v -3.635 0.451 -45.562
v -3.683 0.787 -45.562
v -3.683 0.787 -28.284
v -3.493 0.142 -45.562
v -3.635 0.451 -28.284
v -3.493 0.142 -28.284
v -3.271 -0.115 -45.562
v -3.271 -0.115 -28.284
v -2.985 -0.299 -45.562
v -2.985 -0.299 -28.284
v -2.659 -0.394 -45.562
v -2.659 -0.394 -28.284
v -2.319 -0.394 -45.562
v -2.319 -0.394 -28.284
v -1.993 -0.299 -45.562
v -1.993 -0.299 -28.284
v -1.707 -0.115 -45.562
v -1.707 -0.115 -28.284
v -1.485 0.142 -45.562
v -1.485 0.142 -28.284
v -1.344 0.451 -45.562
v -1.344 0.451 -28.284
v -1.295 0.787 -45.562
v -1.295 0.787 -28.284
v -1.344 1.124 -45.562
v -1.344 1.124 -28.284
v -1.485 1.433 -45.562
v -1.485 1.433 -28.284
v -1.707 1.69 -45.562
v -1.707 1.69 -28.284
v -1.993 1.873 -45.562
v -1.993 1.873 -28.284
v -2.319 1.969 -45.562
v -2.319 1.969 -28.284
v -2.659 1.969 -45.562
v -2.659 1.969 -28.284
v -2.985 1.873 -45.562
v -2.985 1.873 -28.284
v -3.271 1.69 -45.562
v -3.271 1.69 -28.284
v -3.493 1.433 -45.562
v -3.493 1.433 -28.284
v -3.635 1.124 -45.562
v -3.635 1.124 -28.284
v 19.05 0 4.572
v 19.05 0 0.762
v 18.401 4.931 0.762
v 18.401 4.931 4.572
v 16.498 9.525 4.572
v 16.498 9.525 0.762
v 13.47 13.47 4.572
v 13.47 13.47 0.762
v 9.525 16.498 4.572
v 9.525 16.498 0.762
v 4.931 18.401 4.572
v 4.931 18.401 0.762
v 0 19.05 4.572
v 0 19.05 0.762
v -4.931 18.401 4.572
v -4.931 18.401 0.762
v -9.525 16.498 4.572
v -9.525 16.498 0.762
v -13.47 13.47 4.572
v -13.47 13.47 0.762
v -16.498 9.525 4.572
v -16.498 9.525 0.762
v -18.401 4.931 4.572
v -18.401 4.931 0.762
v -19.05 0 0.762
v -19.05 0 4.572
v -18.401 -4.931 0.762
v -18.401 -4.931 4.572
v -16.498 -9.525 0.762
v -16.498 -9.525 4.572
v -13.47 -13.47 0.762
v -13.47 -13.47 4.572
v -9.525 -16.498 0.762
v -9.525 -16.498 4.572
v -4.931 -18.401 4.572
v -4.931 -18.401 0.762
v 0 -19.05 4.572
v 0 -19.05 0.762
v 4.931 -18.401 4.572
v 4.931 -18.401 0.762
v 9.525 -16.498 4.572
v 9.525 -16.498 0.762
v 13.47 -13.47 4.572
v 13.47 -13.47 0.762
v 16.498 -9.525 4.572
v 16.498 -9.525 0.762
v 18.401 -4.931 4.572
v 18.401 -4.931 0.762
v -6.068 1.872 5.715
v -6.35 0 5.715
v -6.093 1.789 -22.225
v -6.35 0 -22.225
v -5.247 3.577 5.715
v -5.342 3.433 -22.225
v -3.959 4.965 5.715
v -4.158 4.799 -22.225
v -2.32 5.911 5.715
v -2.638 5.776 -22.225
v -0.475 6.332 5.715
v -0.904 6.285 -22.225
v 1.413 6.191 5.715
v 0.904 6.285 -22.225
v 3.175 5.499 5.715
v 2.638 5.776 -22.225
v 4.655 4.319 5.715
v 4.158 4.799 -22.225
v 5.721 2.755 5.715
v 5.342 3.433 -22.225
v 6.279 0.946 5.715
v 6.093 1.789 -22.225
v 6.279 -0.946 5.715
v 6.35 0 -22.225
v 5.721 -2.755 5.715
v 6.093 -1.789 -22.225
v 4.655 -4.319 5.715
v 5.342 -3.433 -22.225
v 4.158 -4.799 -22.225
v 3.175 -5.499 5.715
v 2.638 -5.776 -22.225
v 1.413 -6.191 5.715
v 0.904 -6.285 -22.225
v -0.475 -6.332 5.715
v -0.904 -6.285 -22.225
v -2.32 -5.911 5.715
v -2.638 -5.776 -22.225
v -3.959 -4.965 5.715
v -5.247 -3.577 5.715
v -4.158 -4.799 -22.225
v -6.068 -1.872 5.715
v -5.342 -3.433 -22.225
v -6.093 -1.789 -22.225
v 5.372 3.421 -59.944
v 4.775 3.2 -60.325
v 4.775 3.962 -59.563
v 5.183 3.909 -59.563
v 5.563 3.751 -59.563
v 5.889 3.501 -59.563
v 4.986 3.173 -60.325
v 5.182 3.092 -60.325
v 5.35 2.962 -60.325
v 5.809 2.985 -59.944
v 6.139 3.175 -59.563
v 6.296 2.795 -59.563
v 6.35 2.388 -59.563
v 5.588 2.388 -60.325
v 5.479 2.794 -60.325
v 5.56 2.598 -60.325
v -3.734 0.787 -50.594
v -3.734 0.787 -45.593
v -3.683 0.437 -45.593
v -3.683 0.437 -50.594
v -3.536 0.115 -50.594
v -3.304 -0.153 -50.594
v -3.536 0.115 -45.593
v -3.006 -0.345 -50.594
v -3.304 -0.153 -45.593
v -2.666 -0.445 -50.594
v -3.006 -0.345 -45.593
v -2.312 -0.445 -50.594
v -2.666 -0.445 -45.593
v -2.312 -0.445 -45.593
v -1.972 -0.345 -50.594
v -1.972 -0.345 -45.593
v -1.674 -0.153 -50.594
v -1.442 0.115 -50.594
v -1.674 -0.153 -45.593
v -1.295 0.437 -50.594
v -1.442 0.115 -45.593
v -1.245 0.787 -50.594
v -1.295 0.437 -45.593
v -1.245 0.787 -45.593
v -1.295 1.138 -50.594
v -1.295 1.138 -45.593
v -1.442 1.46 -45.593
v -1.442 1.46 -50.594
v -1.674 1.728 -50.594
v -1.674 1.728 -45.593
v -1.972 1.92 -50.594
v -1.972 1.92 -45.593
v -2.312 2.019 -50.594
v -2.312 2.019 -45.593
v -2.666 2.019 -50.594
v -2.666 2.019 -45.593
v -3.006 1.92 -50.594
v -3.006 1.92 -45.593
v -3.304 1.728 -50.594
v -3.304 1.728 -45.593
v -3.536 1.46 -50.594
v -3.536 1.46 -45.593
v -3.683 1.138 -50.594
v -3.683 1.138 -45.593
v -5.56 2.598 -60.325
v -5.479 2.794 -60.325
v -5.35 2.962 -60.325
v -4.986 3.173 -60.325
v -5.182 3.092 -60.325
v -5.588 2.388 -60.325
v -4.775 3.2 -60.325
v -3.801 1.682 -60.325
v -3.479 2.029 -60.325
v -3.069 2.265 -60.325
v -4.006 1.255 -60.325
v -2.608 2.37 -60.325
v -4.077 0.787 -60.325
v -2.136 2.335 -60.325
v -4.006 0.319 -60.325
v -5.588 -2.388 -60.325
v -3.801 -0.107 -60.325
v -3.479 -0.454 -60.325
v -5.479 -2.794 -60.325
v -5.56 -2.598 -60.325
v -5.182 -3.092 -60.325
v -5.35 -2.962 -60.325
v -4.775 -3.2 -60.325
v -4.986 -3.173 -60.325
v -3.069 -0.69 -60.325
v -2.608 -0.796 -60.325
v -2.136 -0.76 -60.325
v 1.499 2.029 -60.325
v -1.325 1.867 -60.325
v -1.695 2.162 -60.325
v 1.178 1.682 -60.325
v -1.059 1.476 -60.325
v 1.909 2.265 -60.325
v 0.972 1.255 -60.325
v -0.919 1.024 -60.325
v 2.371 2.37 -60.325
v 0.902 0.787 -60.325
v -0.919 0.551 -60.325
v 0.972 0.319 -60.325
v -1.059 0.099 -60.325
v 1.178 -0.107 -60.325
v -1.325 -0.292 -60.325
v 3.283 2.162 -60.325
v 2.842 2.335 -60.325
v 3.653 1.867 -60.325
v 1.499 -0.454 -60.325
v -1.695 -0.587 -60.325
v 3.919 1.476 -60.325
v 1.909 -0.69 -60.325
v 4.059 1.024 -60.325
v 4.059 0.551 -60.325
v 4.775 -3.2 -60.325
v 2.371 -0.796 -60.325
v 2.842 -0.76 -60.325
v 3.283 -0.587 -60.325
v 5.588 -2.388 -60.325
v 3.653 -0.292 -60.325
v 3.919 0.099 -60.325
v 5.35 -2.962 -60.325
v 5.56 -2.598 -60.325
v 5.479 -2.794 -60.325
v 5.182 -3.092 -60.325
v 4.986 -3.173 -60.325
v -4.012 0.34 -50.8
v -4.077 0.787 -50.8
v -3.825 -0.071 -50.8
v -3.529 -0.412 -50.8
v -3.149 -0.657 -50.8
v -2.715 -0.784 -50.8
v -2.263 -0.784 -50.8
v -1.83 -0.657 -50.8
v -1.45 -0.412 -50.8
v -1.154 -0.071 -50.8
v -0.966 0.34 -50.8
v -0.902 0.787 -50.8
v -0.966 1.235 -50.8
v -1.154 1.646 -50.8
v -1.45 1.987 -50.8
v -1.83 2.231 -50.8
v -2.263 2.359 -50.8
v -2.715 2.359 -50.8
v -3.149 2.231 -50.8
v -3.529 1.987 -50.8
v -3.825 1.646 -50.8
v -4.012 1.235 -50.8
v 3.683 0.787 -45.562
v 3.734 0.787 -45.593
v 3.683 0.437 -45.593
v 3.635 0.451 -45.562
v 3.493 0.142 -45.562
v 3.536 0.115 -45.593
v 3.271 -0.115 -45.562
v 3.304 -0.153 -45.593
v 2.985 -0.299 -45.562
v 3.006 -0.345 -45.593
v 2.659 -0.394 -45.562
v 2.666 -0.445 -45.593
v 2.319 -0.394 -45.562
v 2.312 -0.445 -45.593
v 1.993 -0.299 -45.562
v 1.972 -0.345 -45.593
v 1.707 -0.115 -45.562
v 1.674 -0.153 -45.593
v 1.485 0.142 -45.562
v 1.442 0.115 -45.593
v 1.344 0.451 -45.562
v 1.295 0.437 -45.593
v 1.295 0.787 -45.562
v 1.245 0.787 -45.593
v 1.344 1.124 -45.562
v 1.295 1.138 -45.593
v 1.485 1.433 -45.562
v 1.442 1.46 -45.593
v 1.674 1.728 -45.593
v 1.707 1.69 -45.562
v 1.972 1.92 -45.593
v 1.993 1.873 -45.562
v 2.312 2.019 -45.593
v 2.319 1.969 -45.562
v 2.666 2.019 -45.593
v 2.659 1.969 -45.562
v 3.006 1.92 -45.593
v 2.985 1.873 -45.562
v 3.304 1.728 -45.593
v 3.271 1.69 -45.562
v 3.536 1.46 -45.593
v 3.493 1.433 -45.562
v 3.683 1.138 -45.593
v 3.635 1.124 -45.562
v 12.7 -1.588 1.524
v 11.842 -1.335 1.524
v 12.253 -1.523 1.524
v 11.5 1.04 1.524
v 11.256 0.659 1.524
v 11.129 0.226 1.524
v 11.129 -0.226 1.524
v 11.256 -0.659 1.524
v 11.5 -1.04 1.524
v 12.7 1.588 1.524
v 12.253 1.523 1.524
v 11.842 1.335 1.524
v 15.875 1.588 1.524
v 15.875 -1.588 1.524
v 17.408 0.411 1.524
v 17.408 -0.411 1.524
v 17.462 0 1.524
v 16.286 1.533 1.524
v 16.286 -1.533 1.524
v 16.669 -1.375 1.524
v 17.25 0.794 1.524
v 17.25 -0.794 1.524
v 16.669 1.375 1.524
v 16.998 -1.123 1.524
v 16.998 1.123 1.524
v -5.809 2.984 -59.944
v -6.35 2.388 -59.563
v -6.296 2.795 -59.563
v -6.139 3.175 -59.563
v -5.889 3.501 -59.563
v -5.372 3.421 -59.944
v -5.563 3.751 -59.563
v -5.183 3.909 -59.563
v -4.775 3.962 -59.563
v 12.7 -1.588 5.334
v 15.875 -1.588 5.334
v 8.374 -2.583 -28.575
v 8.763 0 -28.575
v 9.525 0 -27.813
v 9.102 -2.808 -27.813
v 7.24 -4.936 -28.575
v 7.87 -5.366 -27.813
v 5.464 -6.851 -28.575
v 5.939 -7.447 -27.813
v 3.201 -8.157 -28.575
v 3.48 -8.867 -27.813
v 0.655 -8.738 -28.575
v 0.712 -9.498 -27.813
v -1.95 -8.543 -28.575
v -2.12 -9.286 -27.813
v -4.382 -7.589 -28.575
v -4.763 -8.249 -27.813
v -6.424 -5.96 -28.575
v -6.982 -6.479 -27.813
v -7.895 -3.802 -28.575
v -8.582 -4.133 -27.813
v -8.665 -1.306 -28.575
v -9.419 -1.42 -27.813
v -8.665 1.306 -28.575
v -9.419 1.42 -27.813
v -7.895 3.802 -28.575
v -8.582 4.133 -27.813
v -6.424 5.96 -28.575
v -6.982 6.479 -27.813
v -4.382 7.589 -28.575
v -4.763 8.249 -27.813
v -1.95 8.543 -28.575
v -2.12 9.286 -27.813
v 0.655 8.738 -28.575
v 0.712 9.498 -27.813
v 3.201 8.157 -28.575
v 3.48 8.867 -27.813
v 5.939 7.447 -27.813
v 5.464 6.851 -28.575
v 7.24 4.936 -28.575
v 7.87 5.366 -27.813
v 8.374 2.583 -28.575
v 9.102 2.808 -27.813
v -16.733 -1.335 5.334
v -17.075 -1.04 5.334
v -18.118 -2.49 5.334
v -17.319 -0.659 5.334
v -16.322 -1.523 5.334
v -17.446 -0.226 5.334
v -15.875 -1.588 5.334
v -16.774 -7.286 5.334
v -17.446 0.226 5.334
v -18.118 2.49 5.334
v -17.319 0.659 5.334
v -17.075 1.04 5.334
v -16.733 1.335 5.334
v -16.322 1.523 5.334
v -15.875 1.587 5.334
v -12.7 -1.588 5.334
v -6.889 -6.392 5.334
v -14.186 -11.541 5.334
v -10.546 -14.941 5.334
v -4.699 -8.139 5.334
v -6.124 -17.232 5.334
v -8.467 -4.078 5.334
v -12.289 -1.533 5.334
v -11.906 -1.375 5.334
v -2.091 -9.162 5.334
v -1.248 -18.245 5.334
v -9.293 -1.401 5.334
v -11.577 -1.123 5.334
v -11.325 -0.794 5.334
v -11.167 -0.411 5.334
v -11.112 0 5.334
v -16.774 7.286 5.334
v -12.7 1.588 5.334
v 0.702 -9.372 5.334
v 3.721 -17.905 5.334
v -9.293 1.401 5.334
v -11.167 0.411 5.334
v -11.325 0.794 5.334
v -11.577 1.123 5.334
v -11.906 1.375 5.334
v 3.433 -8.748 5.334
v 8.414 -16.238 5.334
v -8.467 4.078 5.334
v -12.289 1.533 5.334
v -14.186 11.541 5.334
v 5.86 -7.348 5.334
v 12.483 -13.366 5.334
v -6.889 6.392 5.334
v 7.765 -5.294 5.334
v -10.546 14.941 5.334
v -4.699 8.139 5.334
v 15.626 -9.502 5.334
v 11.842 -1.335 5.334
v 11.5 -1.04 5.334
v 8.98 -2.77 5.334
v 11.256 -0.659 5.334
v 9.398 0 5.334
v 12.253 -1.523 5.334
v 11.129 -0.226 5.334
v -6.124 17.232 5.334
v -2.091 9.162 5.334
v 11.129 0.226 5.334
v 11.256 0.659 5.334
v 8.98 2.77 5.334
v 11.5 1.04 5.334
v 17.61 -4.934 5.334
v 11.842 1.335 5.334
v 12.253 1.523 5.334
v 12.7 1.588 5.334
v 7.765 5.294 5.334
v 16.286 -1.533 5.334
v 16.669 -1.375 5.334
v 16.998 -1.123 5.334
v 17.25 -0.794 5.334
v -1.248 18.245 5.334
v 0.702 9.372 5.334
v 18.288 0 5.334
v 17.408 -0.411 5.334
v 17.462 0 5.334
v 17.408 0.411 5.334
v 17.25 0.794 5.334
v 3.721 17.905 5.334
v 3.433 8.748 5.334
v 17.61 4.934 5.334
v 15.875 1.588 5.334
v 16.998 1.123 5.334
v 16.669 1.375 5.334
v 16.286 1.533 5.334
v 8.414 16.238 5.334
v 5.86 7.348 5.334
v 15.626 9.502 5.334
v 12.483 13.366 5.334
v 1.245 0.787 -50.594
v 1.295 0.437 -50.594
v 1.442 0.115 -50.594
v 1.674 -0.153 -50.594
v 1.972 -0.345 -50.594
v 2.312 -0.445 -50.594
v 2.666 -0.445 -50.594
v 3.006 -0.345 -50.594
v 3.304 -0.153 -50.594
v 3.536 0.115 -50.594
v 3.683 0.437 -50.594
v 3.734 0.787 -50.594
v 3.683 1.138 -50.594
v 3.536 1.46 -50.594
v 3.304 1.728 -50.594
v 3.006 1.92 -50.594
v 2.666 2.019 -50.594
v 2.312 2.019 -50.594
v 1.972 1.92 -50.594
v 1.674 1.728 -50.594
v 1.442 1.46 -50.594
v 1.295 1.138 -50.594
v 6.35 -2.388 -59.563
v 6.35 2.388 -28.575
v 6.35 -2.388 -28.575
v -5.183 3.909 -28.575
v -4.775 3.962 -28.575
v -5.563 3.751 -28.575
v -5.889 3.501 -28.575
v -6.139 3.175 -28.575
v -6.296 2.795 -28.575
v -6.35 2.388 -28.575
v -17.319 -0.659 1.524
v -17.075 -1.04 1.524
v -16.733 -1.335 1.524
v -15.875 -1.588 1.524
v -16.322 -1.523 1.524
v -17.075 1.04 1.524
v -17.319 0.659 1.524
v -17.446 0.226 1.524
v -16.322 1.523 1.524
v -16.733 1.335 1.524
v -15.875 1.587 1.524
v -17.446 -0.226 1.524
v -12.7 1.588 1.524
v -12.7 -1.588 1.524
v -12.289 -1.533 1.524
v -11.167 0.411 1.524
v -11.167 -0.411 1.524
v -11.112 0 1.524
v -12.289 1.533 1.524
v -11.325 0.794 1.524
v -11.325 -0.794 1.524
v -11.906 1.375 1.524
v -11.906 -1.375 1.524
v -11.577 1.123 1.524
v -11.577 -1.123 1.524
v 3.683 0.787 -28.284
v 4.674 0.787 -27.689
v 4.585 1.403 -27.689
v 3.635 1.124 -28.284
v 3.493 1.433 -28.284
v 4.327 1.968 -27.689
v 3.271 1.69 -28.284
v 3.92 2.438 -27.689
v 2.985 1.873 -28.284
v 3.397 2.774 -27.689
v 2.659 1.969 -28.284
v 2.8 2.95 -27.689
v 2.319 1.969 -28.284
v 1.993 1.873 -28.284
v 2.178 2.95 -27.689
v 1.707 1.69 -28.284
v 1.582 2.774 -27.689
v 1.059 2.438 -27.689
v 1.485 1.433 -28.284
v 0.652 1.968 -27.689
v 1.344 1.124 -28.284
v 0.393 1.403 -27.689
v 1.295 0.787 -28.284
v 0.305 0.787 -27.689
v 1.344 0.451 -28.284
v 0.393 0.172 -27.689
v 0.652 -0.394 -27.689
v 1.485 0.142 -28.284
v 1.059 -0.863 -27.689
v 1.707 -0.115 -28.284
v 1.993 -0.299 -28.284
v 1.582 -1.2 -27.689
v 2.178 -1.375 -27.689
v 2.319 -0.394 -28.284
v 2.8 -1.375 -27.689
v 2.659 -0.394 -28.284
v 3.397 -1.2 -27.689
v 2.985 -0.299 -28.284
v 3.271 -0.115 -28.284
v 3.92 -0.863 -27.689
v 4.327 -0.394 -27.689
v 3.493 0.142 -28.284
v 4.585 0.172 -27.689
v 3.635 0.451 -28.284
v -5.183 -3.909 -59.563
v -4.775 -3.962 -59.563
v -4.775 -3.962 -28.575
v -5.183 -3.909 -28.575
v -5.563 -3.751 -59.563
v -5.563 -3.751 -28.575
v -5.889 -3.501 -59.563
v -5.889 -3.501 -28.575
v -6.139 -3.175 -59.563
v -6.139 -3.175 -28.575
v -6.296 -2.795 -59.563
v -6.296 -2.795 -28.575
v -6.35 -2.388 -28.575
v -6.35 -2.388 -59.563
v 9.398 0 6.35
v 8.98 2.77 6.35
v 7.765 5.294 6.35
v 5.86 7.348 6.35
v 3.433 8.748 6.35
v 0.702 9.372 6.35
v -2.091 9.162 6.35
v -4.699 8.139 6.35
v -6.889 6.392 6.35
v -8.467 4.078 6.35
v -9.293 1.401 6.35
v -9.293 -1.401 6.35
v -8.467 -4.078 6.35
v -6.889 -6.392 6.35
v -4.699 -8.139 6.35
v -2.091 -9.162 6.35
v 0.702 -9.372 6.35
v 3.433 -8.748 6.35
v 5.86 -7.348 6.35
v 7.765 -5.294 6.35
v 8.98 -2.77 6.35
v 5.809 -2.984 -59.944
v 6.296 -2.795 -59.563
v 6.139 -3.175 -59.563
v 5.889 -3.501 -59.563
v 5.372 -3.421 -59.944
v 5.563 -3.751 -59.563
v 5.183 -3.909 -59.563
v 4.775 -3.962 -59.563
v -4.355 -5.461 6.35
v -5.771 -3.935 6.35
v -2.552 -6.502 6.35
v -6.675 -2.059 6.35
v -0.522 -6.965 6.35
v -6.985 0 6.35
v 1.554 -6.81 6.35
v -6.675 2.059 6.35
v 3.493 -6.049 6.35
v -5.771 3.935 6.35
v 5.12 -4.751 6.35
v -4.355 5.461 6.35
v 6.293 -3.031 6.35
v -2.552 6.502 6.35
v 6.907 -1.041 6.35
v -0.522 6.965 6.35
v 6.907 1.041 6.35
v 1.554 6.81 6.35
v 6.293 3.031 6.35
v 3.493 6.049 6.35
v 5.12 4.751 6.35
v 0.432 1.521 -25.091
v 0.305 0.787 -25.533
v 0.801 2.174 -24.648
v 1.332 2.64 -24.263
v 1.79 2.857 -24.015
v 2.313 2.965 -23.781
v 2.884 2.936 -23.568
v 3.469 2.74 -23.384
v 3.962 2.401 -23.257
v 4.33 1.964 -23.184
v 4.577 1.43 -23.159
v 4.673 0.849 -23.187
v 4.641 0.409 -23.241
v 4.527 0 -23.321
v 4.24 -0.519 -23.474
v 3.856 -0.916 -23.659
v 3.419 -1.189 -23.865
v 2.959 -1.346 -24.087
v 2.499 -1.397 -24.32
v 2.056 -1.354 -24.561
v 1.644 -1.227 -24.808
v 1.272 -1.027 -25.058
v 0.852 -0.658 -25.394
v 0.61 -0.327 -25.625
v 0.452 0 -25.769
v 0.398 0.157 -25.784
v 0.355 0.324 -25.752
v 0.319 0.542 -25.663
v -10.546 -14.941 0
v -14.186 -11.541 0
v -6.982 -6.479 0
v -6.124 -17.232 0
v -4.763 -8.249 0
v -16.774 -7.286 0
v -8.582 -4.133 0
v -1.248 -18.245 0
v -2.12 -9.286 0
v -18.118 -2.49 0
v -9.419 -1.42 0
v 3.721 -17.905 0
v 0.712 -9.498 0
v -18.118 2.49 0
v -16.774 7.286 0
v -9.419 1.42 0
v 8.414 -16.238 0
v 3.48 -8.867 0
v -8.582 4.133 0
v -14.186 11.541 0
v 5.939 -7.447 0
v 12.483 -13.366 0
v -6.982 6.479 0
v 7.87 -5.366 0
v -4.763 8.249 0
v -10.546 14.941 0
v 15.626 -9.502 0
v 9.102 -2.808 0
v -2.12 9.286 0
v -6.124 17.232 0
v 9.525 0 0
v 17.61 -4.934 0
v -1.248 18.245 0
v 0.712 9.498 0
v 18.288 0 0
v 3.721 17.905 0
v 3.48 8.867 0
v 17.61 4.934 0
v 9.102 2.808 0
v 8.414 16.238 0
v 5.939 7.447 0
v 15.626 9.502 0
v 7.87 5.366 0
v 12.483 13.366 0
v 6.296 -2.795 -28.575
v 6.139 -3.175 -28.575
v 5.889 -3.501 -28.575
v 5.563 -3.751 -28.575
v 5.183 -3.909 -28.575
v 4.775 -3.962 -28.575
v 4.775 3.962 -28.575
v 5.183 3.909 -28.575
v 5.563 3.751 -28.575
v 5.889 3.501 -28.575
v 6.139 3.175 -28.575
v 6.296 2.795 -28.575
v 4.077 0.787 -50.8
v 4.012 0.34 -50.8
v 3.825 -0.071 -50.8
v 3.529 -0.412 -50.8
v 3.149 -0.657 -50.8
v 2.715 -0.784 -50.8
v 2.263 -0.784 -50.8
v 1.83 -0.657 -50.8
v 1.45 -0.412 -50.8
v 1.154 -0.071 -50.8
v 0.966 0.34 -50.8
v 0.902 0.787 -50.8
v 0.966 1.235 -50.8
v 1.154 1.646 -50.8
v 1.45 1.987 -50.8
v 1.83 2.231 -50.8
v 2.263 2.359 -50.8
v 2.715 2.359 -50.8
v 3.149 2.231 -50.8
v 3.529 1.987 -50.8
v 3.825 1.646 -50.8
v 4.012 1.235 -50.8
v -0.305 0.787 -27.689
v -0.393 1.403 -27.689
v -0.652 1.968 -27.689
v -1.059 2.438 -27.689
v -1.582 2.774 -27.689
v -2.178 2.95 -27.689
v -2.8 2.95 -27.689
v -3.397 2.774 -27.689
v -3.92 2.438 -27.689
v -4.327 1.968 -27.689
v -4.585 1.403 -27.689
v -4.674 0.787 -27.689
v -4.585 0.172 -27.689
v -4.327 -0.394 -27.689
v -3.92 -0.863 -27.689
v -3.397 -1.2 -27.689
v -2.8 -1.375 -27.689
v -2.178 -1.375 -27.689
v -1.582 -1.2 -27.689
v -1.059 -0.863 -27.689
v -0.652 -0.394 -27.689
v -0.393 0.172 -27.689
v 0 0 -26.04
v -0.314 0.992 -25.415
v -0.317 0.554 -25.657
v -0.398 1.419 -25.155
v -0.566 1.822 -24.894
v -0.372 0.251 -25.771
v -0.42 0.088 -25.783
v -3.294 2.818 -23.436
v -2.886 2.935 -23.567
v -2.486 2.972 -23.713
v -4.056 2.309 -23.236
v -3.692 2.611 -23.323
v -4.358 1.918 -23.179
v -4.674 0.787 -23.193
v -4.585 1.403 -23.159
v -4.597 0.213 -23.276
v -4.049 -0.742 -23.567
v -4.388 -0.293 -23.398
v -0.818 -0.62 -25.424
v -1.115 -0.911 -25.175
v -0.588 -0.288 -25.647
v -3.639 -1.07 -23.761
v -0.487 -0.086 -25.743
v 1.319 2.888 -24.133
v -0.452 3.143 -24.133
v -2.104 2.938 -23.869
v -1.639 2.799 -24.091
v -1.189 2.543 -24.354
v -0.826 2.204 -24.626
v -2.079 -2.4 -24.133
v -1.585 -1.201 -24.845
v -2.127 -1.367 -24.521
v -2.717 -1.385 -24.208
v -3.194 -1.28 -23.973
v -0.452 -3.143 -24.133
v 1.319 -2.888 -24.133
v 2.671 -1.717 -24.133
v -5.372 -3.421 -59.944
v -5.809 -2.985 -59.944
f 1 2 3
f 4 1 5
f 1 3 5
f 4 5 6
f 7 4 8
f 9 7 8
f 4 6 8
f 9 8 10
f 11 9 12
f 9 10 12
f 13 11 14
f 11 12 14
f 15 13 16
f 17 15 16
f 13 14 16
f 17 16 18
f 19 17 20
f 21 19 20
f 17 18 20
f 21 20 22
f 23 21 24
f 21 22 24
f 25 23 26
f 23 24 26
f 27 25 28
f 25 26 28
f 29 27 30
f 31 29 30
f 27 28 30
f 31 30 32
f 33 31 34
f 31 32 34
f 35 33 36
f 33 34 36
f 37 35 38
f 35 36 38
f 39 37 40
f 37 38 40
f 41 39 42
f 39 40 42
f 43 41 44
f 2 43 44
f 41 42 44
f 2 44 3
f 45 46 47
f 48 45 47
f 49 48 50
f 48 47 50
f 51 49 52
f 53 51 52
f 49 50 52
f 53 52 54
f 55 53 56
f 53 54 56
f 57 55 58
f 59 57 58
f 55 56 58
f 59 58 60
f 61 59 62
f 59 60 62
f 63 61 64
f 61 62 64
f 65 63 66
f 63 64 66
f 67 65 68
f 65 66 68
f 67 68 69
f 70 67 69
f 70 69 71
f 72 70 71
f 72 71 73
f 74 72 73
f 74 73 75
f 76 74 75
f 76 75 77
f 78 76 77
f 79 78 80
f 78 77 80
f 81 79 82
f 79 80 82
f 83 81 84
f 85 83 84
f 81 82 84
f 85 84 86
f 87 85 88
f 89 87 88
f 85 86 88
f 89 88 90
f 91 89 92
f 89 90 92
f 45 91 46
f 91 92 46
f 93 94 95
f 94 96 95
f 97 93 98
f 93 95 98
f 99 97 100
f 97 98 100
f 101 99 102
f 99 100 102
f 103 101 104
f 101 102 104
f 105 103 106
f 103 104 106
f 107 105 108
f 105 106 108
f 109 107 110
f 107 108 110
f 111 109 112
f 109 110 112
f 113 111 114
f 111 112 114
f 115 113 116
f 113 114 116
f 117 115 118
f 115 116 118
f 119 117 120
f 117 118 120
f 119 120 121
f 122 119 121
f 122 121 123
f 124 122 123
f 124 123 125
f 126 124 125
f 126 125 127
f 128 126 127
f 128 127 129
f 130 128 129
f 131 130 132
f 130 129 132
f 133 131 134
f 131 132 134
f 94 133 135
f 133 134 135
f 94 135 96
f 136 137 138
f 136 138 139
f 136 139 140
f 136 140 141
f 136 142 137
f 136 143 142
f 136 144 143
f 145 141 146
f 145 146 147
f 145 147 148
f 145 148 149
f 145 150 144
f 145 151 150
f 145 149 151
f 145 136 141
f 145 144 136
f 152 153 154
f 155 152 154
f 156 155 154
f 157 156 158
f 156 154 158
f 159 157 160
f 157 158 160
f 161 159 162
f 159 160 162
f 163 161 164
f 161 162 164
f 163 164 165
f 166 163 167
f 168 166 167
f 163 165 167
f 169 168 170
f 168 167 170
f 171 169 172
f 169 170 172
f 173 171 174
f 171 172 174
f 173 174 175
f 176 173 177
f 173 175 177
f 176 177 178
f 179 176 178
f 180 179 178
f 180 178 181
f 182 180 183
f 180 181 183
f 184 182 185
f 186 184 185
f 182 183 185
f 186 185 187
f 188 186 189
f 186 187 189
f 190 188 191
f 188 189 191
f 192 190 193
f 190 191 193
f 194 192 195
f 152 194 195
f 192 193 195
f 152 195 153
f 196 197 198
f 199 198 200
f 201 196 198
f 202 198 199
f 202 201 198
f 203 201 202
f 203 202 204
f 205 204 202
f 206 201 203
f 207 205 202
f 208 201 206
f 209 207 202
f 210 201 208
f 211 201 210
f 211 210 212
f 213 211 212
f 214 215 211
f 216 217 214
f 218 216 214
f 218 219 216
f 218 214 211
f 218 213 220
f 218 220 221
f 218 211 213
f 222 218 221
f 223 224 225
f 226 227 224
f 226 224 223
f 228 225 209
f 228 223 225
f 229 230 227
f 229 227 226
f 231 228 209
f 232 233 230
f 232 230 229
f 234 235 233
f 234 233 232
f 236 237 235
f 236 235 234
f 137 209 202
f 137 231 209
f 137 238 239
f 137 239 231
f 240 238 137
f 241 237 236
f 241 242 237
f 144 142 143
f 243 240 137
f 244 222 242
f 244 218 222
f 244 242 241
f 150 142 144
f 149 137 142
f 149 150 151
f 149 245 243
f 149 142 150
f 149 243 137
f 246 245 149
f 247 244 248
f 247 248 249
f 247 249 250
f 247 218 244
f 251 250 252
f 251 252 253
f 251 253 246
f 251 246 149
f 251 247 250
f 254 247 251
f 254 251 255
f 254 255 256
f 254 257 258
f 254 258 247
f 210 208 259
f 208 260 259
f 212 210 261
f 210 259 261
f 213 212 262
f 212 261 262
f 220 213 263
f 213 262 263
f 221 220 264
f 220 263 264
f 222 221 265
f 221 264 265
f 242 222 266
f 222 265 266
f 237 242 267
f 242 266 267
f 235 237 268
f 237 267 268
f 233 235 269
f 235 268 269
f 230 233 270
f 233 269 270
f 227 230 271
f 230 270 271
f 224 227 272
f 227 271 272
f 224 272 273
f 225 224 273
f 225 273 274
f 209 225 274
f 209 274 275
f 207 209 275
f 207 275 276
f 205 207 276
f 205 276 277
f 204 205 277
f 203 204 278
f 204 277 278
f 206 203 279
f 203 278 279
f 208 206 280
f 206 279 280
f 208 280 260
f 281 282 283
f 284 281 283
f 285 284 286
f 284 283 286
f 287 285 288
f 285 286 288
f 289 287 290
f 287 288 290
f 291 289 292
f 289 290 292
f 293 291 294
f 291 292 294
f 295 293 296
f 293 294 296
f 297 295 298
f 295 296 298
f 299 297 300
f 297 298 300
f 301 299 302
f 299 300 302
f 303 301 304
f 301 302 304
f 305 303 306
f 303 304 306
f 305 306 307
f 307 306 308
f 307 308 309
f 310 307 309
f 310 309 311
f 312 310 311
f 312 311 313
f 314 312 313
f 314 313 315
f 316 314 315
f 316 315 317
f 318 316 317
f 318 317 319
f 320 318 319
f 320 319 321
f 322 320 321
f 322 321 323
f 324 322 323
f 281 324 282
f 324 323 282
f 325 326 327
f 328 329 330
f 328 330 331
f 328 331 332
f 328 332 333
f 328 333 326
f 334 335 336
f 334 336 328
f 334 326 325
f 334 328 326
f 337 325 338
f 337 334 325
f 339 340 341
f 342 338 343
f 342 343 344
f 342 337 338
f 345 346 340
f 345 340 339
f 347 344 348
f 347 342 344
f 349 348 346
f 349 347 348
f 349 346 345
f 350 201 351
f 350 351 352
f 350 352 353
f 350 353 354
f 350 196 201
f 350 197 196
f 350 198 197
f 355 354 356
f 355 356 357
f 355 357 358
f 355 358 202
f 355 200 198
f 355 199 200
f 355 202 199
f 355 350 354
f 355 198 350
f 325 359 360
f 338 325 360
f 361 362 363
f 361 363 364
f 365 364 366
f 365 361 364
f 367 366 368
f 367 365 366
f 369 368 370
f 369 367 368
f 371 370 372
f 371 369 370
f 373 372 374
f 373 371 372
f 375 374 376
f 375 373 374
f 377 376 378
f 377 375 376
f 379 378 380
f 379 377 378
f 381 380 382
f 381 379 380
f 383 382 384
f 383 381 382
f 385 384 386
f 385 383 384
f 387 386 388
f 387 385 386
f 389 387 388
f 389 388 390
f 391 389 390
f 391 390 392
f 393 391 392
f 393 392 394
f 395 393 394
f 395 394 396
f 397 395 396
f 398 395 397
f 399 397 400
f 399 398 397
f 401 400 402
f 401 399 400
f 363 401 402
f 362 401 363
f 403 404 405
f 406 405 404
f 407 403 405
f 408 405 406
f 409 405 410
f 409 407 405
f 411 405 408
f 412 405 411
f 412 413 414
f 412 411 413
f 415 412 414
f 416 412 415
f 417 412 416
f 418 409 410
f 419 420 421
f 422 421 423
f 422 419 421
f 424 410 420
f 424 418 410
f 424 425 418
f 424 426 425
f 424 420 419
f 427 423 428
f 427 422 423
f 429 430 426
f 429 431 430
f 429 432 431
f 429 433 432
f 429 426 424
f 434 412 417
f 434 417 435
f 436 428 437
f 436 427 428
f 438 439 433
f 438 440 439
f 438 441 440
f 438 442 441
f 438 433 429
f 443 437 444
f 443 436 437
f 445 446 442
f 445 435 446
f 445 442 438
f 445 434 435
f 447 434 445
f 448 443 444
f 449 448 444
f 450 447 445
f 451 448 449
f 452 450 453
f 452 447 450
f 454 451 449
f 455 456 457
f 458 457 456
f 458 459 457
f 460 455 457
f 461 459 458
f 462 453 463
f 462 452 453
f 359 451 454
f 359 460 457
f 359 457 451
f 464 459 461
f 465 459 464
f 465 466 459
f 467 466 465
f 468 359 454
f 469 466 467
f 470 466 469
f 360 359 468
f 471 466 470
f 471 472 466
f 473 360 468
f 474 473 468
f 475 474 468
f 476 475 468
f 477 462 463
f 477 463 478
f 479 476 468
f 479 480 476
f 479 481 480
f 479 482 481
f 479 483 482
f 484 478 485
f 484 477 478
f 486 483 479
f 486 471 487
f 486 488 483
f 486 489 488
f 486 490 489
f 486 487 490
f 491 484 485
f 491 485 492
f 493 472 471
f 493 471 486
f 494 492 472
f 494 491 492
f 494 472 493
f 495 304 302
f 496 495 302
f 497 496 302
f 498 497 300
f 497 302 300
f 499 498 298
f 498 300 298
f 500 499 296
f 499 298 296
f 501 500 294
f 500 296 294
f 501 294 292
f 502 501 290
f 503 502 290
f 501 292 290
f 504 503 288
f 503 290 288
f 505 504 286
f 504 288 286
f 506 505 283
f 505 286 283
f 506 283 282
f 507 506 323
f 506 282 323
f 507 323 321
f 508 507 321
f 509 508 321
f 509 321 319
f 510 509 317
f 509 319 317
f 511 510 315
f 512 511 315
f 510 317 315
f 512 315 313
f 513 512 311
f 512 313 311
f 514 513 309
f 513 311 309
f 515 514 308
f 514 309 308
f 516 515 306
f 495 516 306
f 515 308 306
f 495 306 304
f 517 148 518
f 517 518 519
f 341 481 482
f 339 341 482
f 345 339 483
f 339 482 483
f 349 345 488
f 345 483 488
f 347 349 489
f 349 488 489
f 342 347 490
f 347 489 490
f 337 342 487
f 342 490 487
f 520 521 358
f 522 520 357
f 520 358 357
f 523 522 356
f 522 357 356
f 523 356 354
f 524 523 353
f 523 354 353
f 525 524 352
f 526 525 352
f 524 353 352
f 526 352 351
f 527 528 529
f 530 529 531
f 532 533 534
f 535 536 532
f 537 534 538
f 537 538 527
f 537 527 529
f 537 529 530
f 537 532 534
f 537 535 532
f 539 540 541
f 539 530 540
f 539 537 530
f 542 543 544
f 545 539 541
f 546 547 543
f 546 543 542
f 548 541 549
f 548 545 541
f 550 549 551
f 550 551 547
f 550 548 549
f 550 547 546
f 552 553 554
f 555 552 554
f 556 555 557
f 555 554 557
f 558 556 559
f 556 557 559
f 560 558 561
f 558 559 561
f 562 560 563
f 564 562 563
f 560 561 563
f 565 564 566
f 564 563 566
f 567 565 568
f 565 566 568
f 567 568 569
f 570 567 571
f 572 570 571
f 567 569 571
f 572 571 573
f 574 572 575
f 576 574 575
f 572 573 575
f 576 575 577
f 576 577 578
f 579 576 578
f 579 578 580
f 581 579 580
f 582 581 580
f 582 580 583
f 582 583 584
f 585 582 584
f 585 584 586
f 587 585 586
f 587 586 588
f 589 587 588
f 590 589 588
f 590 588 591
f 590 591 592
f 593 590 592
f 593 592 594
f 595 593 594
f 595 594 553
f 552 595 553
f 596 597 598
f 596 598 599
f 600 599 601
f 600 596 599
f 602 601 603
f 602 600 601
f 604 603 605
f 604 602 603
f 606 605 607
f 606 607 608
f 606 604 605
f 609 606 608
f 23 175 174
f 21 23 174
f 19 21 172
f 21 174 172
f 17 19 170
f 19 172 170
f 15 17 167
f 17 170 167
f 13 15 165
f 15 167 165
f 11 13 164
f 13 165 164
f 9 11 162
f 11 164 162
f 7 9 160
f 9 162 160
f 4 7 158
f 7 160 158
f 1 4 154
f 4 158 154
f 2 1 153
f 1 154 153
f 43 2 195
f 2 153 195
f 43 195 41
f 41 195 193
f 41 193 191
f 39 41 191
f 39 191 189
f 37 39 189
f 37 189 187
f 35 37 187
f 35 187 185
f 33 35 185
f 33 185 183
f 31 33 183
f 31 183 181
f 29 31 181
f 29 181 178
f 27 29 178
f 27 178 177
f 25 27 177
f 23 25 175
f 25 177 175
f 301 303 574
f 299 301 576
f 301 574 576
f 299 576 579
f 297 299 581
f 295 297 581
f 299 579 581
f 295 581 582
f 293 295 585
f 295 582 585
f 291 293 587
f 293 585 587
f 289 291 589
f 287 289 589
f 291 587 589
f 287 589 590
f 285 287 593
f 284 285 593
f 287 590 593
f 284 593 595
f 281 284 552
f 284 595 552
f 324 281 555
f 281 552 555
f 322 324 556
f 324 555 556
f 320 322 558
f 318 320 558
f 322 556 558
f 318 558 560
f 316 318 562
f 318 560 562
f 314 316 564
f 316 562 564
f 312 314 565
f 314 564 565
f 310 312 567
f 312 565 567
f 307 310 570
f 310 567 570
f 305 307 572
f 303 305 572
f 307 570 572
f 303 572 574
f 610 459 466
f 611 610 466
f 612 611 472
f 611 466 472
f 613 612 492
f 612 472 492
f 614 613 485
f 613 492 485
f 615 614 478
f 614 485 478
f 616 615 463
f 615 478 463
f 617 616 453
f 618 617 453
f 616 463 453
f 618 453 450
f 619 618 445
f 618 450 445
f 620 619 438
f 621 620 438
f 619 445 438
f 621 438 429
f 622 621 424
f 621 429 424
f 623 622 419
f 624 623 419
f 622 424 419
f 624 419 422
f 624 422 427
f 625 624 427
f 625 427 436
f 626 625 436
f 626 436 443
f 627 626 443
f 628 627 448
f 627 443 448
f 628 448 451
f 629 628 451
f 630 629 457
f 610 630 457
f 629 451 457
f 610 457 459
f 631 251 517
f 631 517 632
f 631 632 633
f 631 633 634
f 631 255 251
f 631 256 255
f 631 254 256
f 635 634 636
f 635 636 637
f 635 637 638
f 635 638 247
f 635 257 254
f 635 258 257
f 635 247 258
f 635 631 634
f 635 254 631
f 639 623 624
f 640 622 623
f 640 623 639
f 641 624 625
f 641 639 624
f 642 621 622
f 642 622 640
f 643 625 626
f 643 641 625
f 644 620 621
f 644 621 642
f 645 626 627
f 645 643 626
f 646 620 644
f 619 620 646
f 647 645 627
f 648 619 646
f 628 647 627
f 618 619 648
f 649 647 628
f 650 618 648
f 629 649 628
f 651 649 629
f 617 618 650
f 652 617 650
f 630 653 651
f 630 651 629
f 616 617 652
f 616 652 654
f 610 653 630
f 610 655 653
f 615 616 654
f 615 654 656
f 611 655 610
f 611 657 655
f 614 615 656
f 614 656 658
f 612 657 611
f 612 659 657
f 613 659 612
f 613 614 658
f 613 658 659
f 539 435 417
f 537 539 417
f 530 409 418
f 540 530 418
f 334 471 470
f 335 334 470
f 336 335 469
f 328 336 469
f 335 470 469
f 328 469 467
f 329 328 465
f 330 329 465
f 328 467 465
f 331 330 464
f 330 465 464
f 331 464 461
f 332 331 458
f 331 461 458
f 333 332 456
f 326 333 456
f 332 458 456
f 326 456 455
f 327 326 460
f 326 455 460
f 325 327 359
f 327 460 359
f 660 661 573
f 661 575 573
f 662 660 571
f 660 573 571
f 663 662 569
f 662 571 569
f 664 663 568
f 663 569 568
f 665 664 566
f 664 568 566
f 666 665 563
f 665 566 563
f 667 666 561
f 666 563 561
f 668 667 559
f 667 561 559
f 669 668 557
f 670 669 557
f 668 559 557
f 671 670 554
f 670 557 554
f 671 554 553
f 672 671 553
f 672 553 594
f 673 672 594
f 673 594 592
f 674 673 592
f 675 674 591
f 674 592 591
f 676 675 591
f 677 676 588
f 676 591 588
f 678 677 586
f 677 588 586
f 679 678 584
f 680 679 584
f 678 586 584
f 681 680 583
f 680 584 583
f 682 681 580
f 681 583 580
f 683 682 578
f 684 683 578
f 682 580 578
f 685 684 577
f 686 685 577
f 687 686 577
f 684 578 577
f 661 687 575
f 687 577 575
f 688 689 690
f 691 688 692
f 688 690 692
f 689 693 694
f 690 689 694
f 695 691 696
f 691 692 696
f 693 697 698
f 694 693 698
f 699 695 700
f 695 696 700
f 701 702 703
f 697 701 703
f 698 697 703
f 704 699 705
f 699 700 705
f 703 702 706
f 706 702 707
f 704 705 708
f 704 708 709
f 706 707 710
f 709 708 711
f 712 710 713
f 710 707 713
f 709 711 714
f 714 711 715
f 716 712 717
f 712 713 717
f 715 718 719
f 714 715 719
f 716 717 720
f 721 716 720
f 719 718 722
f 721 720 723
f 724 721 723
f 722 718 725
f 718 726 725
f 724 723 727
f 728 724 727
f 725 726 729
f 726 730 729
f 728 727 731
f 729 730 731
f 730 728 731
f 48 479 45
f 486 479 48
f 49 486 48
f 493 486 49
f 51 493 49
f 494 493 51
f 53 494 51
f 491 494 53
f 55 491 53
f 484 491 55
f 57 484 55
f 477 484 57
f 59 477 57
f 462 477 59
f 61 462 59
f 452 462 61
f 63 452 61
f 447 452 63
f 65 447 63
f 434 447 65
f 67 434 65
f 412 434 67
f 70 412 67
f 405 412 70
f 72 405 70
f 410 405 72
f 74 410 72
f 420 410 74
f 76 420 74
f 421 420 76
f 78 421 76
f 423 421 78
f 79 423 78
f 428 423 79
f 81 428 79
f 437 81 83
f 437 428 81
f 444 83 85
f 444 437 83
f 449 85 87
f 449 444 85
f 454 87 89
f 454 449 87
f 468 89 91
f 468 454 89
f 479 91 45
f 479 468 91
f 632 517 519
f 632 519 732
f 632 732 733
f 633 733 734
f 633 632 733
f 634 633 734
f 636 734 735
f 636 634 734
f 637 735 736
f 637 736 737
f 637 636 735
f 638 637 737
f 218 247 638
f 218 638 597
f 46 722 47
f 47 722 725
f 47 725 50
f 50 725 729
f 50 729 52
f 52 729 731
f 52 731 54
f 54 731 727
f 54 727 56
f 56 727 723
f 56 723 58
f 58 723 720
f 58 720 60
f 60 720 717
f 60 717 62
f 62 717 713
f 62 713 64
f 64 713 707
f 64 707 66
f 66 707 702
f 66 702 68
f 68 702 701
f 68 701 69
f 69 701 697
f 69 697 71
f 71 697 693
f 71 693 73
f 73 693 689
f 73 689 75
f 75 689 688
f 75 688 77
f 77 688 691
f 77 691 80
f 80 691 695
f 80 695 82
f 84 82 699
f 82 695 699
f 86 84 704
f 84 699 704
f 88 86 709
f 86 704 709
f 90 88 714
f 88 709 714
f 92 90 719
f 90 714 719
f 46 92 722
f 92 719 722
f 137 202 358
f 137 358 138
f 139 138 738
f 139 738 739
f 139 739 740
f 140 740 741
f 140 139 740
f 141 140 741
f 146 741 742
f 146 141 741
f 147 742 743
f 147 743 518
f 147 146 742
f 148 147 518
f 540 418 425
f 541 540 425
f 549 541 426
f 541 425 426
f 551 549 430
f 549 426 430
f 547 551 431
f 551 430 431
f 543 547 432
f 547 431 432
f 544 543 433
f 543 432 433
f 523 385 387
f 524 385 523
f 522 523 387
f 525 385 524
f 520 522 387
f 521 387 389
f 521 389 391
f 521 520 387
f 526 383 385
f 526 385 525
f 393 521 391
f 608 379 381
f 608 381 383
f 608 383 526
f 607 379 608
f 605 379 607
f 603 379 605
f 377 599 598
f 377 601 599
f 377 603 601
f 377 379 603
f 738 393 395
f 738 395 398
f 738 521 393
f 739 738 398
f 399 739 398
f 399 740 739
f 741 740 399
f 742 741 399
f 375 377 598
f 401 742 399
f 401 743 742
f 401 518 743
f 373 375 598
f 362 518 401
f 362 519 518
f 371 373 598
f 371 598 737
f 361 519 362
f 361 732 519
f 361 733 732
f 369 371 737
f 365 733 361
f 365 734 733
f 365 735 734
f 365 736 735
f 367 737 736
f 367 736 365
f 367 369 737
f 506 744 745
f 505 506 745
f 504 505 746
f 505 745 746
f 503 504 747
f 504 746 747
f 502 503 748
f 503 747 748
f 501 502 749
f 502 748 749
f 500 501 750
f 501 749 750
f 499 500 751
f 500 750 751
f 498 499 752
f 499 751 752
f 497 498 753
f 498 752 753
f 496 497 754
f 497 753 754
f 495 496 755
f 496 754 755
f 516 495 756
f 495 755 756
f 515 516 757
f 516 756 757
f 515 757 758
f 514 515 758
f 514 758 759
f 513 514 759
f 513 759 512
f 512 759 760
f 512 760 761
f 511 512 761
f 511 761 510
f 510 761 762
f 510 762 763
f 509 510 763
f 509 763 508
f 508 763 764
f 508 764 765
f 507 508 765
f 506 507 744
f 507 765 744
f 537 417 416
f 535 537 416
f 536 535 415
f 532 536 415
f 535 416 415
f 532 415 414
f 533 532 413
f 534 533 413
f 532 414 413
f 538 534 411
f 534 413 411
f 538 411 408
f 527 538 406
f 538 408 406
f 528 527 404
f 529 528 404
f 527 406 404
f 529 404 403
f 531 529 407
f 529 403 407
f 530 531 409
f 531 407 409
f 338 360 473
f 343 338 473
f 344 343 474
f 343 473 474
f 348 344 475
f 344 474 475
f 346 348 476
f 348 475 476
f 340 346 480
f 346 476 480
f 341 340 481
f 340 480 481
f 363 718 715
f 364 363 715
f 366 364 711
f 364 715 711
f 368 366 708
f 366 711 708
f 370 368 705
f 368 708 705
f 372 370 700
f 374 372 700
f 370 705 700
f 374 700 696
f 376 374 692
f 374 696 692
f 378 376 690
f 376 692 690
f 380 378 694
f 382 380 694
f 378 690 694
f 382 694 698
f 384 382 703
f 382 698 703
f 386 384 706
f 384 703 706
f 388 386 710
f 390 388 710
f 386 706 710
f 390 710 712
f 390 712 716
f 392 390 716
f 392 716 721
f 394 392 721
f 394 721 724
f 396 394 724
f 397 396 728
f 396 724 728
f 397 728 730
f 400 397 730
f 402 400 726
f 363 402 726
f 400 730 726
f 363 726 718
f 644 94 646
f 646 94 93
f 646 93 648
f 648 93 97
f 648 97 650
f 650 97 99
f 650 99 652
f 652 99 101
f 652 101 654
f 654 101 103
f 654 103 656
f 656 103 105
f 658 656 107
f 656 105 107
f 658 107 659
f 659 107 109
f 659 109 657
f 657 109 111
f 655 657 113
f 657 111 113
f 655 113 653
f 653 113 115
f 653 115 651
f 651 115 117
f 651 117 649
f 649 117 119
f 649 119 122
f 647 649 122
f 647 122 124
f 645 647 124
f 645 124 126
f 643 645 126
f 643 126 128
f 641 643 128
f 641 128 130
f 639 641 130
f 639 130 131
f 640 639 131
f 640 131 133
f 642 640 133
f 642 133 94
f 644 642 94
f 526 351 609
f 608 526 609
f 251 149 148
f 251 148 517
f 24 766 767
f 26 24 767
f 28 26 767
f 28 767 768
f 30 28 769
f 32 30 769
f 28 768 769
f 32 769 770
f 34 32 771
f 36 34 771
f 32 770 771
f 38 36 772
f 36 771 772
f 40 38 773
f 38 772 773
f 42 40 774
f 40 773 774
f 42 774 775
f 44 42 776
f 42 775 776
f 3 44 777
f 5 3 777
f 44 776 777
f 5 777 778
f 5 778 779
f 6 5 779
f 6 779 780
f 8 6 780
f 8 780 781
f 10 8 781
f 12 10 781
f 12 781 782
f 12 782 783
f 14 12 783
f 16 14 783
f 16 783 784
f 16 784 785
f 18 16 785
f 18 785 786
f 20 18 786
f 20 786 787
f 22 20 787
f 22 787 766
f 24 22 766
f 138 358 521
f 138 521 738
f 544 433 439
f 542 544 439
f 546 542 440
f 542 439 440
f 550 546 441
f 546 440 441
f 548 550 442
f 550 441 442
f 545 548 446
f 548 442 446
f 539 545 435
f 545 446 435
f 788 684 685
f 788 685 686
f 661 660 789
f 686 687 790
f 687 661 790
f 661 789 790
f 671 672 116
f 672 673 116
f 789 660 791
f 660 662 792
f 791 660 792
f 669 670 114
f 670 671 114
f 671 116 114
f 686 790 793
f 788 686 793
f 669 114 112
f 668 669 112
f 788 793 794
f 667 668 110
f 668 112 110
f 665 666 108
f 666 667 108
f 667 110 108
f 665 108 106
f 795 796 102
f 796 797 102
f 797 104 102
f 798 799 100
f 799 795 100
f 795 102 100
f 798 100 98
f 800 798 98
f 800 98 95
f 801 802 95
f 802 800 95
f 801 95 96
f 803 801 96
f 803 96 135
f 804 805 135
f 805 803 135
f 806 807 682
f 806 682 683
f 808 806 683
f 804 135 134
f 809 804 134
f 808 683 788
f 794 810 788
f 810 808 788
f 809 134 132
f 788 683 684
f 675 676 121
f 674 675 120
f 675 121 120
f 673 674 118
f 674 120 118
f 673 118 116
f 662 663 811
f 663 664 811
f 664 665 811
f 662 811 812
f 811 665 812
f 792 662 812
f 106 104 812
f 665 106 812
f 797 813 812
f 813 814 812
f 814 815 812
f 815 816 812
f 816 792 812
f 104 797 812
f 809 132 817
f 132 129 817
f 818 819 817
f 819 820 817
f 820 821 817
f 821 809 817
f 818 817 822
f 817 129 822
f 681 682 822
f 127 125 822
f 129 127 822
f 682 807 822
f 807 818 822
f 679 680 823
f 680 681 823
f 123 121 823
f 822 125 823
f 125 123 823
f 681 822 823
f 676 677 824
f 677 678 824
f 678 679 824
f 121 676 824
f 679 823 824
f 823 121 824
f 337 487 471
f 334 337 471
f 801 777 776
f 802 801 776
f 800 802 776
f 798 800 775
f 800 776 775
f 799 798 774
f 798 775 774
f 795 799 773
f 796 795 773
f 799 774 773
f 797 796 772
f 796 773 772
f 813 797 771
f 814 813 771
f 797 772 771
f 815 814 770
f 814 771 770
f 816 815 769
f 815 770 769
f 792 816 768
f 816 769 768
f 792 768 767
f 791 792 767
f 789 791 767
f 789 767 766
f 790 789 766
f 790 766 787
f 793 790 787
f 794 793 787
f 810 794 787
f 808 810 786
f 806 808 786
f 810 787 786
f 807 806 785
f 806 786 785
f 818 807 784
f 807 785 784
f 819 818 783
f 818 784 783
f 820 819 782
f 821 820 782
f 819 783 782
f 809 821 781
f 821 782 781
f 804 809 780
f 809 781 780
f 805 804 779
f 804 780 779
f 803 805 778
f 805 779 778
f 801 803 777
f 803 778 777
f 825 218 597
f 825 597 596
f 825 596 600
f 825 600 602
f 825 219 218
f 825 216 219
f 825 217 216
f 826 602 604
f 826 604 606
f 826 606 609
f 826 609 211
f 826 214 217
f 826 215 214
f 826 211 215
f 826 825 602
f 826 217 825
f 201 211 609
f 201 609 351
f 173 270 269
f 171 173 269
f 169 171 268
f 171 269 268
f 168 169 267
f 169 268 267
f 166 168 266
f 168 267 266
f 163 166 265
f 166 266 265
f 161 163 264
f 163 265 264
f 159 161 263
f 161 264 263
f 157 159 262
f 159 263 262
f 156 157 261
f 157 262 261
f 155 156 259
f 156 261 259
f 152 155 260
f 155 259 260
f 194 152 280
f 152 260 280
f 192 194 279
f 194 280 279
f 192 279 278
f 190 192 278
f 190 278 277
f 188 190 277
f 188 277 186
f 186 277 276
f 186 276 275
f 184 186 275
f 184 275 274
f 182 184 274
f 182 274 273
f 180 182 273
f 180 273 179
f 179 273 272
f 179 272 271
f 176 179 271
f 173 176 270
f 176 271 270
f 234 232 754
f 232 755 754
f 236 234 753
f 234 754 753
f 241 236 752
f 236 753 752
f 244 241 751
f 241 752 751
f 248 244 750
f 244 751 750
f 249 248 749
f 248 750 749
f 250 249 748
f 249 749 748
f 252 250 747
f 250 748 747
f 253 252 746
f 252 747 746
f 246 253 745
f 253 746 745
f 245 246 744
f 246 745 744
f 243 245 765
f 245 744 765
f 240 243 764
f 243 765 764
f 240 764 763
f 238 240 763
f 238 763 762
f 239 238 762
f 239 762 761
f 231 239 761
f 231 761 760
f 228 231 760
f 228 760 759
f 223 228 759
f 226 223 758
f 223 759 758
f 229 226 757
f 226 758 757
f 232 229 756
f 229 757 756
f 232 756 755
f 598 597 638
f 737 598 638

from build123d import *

# Parameters (mm, degrees)
F0_R           = 19.05
F1_DEPTH       = 5.334
F2_R           = 9.398
F3_DEPTH       = 1.016
F4_R           = 9.525
F5_DEPTH       = 28.575
F6_W           = 12.7
F6_H           = 7.9248
F7_DEPTH       = 31.75
F9_D           = 12.7
F9_DEPTH       = 28.575
F9_CSINK_D     = 13.97
F9_CSINK_ANGLE = 90
F9_TIP         = 3.8154649308
F10_SIZE       = 0.762
F12_D          = 2.3876
F14_D          = 2.4892
F14_DEPTH      = 14.732
F14_TIP        = 0.7478311264
F16_D          = 3.175
F16_DEPTH      = 9.525
F16_TIP        = 0.9538662327
F18_D          = 4.3688
F18_DEPTH      = 1.905
F18_START      = 32.1342766
F18_TIP        = 1.3125199362
F20_DEPTH      = 3.81
F21_R          = 1.5748
F22_SIZE       = 0.762


# Not quite as in the source:
# - a length typed as a fraction of an inch, garbled in the dataset ("3 / 203.2 mm" for 3/8 in), is restored


with BuildPart() as f1:
    # F0 (on Top) → F1 (new body)
    with BuildSketch(Plane.XY):
        Circle(F0_R)
    extrude(amount=F1_DEPTH)

    # F2 (on face) → F3 (join)
    with BuildSketch(Plane.XY.offset(5.334)):
        Circle(F2_R)
    extrude(amount=F3_DEPTH)

    # F4 (on face) → F5 (join)
    with BuildSketch(Plane(origin=(0, 0, 0), x_dir=(1, 0, 0), z_dir=(0, 0, -1))):
        Circle(F4_R)
    extrude(amount=F5_DEPTH)

    # F6 (on face) → F7 (join)
    with BuildSketch(Plane(origin=(0, 0, -28.575), x_dir=(1, 0, 0), z_dir=(0, 0, -1))):
        Rectangle(F6_W, F6_H)
    extrude(amount=F7_DEPTH)

    # F9
    with Locations(Plane.XY.offset(6.35)):
        with Locations((0, 0)):
            CounterSinkHole(F9_D / 2, F9_CSINK_D / 2, depth=F9_DEPTH, counter_sink_angle=F9_CSINK_ANGLE)
            with Locations((0, 0, -(F9_DEPTH + F9_TIP / 2))):  # 118° drill point
                Cone(0, F9_D / 2, F9_TIP, mode=Mode.SUBTRACT)

    # F10
    f10_edges = [f1.edges().sort_by_distance(p)[0] for p in [
        (-9.525, 0, -28.575),
        (-19.05, 0, 0),
        (-19.05, 0, 5.334),
    ]]
    chamfer(f10_edges, length=F10_SIZE)

    # F12 (through all)
    with Locations(Plane(origin=(0, 0, -60.325), x_dir=(1, 0, 0), z_dir=(0, 0, -1))):
        with Locations((2.4892, -0.7874), (-2.4892, -0.7874)):
            Hole(F12_D / 2)

    # F14
    with Locations(Plane(origin=(0, 0, -60.325), x_dir=(1, 0, 0), z_dir=(0, 0, -1))):
        with Locations((2.4892, -0.7874), (-2.4892, -0.7874)):
            Hole(F14_D / 2, depth=F14_DEPTH)
            with Locations((0, 0, -(F14_DEPTH + F14_TIP / 2))):  # 118° drill point
                Cone(0, F14_D / 2, F14_TIP, mode=Mode.SUBTRACT)

    # F16
    with Locations(Plane(origin=(0, 0, -60.325), x_dir=(1, 0, 0), z_dir=(0, 0, -1))):
        with Locations((2.4892, -0.7874), (-2.4892, -0.7874)):
            Hole(F16_D / 2, depth=F16_DEPTH)
            with Locations((0, 0, -(F16_DEPTH + F16_TIP / 2))):  # 118° drill point
                Cone(0, F16_D / 2, F16_TIP, mode=Mode.SUBTRACT)

    # F18
    # its depths count from where the whole tool has entered the part; down to there all is cleared
    with Locations(Plane.XY.offset(6.35)):
        with Locations((2.4892, 0.7874), (-2.4892, 0.7874)):
            Hole(F18_D / 2, depth=F18_START)
    with Locations(Plane.XY.offset(6.35).offset(-F18_START)):
        with Locations((2.4892, 0.7874), (-2.4892, 0.7874)):
            Hole(F18_D / 2, depth=F18_DEPTH)
            with Locations((0, 0, -(F18_DEPTH + F18_TIP / 2))):  # 118° drill point
                Cone(0, F18_D / 2, F18_TIP, mode=Mode.SUBTRACT)

    # F19 (on face) → F20 (cut)
    with BuildSketch(Plane.XY.offset(5.334)):
        with BuildLine():
            ThreePointArc((15.875, 1.5875), (14.7524679849, 1.1225320151), (14.2875, 0))
            ThreePointArc((14.2875, 0), (14.7524679849, -1.1225320151), (15.875, -1.5875))
            ThreePointArc((15.875, -1.5875), (16.9975320151, -1.1225320151), (17.4625, 0))
            ThreePointArc((17.4625, 0), (16.9975320151, 1.1225320151), (15.875, 1.5875))
        make_face()
        with BuildLine():
            ThreePointArc((12.7, -1.5875), (13.8225320151, -1.1225320151), (14.2875, 0))
            ThreePointArc((14.2875, 0), (13.8225320151, 1.1225320151), (12.7, 1.5875))
            Line((12.7, 1.5875), (12.7, -1.5875))
        make_face()
        with BuildLine():
            ThreePointArc((12.7, 1.5875), (13.8225320151, 1.1225320151), (14.2875, 0))
            ThreePointArc((14.2875, 0), (14.7524679849, 1.1225320151), (15.875, 1.5875))
            Line((15.875, 1.5875), (12.7, 1.5875))
        make_face()
        with BuildLine():
            Line((12.7, -1.5875), (12.7, 1.5875))
            ThreePointArc((12.7, 1.5875), (11.1125, 0), (12.7, -1.5875))
        make_face()
        with BuildLine():
            ThreePointArc((15.875, -1.5875), (14.7524679849, -1.1225320151), (14.2875, 0))
            ThreePointArc((14.2875, 0), (13.8225320151, -1.1225320151), (12.7, -1.5875))
            Line((12.7, -1.5875), (15.875, -1.5875))
        make_face()
        with BuildLine():
            ThreePointArc((-12.7, -1.5875), (-11.5774679849, -1.1225320151), (-11.1125, 0))
            ThreePointArc((-11.1125, 0), (-11.5774679849, 1.1225320151), (-12.7, 1.5875))
            ThreePointArc((-12.7, 1.5875), (-13.8225320151, 1.1225320151), (-14.2875, 0))
            ThreePointArc((-14.2875, 0), (-13.8225320151, -1.1225320151), (-12.7, -1.5875))
        make_face()
        with BuildLine():
            Line((-15.875, -1.5875), (-12.7, -1.5875))
            ThreePointArc((-12.7, -1.5875), (-13.8225320151, -1.1225320151), (-14.2875, 0))
            ThreePointArc((-14.2875, 0), (-14.7524679849, -1.1225320151), (-15.875, -1.5875))
        make_face()
        with BuildLine():
            ThreePointArc((-14.2875, 0), (-13.8225320151, 1.1225320151), (-12.7, 1.5875))
            Line((-12.7, 1.5875), (-15.875, 1.5875))
            ThreePointArc((-15.875, 1.5875), (-14.7524679849, 1.1225320151), (-14.2875, 0))
        make_face()
        with BuildLine():
            ThreePointArc((-15.875, -1.5875), (-14.7524679849, -1.1225320151), (-14.2875, 0))
            ThreePointArc((-14.2875, 0), (-14.7524679849, 1.1225320151), (-15.875, 1.5875))
            ThreePointArc((-15.875, 1.5875), (-17.4625, 0), (-15.875, -1.5875))
        make_face()
    extrude(amount=-F20_DEPTH, mode=Mode.SUBTRACT)

    # F21
    f21_edges = [f1.edges().sort_by_distance(p)[0] for p in [
        (6.35, 3.9624, -44.45),
        (6.35, -3.9624, -44.45),
        (-6.35, -3.9624, -44.45),
        (-6.35, 3.9624, -44.45),
    ]]
    fillet(f21_edges, radius=F21_R)

    # F22
    f22_edges = [f1.edges().sort_by_distance(p)[0] for p in [
        (6.35, 0, -60.325),
        (5.888752, -3.501152, -60.325),
        (0, -3.9624, -60.325),
        (-6.35, 0, -60.325),
        (-5.888752, -3.501152, -60.325),
        (0, 3.9624, -60.325),
        (5.888752, 3.501152, -60.325),
    ]]
    chamfer(f22_edges, length=F22_SIZE)


solid = f1.part
